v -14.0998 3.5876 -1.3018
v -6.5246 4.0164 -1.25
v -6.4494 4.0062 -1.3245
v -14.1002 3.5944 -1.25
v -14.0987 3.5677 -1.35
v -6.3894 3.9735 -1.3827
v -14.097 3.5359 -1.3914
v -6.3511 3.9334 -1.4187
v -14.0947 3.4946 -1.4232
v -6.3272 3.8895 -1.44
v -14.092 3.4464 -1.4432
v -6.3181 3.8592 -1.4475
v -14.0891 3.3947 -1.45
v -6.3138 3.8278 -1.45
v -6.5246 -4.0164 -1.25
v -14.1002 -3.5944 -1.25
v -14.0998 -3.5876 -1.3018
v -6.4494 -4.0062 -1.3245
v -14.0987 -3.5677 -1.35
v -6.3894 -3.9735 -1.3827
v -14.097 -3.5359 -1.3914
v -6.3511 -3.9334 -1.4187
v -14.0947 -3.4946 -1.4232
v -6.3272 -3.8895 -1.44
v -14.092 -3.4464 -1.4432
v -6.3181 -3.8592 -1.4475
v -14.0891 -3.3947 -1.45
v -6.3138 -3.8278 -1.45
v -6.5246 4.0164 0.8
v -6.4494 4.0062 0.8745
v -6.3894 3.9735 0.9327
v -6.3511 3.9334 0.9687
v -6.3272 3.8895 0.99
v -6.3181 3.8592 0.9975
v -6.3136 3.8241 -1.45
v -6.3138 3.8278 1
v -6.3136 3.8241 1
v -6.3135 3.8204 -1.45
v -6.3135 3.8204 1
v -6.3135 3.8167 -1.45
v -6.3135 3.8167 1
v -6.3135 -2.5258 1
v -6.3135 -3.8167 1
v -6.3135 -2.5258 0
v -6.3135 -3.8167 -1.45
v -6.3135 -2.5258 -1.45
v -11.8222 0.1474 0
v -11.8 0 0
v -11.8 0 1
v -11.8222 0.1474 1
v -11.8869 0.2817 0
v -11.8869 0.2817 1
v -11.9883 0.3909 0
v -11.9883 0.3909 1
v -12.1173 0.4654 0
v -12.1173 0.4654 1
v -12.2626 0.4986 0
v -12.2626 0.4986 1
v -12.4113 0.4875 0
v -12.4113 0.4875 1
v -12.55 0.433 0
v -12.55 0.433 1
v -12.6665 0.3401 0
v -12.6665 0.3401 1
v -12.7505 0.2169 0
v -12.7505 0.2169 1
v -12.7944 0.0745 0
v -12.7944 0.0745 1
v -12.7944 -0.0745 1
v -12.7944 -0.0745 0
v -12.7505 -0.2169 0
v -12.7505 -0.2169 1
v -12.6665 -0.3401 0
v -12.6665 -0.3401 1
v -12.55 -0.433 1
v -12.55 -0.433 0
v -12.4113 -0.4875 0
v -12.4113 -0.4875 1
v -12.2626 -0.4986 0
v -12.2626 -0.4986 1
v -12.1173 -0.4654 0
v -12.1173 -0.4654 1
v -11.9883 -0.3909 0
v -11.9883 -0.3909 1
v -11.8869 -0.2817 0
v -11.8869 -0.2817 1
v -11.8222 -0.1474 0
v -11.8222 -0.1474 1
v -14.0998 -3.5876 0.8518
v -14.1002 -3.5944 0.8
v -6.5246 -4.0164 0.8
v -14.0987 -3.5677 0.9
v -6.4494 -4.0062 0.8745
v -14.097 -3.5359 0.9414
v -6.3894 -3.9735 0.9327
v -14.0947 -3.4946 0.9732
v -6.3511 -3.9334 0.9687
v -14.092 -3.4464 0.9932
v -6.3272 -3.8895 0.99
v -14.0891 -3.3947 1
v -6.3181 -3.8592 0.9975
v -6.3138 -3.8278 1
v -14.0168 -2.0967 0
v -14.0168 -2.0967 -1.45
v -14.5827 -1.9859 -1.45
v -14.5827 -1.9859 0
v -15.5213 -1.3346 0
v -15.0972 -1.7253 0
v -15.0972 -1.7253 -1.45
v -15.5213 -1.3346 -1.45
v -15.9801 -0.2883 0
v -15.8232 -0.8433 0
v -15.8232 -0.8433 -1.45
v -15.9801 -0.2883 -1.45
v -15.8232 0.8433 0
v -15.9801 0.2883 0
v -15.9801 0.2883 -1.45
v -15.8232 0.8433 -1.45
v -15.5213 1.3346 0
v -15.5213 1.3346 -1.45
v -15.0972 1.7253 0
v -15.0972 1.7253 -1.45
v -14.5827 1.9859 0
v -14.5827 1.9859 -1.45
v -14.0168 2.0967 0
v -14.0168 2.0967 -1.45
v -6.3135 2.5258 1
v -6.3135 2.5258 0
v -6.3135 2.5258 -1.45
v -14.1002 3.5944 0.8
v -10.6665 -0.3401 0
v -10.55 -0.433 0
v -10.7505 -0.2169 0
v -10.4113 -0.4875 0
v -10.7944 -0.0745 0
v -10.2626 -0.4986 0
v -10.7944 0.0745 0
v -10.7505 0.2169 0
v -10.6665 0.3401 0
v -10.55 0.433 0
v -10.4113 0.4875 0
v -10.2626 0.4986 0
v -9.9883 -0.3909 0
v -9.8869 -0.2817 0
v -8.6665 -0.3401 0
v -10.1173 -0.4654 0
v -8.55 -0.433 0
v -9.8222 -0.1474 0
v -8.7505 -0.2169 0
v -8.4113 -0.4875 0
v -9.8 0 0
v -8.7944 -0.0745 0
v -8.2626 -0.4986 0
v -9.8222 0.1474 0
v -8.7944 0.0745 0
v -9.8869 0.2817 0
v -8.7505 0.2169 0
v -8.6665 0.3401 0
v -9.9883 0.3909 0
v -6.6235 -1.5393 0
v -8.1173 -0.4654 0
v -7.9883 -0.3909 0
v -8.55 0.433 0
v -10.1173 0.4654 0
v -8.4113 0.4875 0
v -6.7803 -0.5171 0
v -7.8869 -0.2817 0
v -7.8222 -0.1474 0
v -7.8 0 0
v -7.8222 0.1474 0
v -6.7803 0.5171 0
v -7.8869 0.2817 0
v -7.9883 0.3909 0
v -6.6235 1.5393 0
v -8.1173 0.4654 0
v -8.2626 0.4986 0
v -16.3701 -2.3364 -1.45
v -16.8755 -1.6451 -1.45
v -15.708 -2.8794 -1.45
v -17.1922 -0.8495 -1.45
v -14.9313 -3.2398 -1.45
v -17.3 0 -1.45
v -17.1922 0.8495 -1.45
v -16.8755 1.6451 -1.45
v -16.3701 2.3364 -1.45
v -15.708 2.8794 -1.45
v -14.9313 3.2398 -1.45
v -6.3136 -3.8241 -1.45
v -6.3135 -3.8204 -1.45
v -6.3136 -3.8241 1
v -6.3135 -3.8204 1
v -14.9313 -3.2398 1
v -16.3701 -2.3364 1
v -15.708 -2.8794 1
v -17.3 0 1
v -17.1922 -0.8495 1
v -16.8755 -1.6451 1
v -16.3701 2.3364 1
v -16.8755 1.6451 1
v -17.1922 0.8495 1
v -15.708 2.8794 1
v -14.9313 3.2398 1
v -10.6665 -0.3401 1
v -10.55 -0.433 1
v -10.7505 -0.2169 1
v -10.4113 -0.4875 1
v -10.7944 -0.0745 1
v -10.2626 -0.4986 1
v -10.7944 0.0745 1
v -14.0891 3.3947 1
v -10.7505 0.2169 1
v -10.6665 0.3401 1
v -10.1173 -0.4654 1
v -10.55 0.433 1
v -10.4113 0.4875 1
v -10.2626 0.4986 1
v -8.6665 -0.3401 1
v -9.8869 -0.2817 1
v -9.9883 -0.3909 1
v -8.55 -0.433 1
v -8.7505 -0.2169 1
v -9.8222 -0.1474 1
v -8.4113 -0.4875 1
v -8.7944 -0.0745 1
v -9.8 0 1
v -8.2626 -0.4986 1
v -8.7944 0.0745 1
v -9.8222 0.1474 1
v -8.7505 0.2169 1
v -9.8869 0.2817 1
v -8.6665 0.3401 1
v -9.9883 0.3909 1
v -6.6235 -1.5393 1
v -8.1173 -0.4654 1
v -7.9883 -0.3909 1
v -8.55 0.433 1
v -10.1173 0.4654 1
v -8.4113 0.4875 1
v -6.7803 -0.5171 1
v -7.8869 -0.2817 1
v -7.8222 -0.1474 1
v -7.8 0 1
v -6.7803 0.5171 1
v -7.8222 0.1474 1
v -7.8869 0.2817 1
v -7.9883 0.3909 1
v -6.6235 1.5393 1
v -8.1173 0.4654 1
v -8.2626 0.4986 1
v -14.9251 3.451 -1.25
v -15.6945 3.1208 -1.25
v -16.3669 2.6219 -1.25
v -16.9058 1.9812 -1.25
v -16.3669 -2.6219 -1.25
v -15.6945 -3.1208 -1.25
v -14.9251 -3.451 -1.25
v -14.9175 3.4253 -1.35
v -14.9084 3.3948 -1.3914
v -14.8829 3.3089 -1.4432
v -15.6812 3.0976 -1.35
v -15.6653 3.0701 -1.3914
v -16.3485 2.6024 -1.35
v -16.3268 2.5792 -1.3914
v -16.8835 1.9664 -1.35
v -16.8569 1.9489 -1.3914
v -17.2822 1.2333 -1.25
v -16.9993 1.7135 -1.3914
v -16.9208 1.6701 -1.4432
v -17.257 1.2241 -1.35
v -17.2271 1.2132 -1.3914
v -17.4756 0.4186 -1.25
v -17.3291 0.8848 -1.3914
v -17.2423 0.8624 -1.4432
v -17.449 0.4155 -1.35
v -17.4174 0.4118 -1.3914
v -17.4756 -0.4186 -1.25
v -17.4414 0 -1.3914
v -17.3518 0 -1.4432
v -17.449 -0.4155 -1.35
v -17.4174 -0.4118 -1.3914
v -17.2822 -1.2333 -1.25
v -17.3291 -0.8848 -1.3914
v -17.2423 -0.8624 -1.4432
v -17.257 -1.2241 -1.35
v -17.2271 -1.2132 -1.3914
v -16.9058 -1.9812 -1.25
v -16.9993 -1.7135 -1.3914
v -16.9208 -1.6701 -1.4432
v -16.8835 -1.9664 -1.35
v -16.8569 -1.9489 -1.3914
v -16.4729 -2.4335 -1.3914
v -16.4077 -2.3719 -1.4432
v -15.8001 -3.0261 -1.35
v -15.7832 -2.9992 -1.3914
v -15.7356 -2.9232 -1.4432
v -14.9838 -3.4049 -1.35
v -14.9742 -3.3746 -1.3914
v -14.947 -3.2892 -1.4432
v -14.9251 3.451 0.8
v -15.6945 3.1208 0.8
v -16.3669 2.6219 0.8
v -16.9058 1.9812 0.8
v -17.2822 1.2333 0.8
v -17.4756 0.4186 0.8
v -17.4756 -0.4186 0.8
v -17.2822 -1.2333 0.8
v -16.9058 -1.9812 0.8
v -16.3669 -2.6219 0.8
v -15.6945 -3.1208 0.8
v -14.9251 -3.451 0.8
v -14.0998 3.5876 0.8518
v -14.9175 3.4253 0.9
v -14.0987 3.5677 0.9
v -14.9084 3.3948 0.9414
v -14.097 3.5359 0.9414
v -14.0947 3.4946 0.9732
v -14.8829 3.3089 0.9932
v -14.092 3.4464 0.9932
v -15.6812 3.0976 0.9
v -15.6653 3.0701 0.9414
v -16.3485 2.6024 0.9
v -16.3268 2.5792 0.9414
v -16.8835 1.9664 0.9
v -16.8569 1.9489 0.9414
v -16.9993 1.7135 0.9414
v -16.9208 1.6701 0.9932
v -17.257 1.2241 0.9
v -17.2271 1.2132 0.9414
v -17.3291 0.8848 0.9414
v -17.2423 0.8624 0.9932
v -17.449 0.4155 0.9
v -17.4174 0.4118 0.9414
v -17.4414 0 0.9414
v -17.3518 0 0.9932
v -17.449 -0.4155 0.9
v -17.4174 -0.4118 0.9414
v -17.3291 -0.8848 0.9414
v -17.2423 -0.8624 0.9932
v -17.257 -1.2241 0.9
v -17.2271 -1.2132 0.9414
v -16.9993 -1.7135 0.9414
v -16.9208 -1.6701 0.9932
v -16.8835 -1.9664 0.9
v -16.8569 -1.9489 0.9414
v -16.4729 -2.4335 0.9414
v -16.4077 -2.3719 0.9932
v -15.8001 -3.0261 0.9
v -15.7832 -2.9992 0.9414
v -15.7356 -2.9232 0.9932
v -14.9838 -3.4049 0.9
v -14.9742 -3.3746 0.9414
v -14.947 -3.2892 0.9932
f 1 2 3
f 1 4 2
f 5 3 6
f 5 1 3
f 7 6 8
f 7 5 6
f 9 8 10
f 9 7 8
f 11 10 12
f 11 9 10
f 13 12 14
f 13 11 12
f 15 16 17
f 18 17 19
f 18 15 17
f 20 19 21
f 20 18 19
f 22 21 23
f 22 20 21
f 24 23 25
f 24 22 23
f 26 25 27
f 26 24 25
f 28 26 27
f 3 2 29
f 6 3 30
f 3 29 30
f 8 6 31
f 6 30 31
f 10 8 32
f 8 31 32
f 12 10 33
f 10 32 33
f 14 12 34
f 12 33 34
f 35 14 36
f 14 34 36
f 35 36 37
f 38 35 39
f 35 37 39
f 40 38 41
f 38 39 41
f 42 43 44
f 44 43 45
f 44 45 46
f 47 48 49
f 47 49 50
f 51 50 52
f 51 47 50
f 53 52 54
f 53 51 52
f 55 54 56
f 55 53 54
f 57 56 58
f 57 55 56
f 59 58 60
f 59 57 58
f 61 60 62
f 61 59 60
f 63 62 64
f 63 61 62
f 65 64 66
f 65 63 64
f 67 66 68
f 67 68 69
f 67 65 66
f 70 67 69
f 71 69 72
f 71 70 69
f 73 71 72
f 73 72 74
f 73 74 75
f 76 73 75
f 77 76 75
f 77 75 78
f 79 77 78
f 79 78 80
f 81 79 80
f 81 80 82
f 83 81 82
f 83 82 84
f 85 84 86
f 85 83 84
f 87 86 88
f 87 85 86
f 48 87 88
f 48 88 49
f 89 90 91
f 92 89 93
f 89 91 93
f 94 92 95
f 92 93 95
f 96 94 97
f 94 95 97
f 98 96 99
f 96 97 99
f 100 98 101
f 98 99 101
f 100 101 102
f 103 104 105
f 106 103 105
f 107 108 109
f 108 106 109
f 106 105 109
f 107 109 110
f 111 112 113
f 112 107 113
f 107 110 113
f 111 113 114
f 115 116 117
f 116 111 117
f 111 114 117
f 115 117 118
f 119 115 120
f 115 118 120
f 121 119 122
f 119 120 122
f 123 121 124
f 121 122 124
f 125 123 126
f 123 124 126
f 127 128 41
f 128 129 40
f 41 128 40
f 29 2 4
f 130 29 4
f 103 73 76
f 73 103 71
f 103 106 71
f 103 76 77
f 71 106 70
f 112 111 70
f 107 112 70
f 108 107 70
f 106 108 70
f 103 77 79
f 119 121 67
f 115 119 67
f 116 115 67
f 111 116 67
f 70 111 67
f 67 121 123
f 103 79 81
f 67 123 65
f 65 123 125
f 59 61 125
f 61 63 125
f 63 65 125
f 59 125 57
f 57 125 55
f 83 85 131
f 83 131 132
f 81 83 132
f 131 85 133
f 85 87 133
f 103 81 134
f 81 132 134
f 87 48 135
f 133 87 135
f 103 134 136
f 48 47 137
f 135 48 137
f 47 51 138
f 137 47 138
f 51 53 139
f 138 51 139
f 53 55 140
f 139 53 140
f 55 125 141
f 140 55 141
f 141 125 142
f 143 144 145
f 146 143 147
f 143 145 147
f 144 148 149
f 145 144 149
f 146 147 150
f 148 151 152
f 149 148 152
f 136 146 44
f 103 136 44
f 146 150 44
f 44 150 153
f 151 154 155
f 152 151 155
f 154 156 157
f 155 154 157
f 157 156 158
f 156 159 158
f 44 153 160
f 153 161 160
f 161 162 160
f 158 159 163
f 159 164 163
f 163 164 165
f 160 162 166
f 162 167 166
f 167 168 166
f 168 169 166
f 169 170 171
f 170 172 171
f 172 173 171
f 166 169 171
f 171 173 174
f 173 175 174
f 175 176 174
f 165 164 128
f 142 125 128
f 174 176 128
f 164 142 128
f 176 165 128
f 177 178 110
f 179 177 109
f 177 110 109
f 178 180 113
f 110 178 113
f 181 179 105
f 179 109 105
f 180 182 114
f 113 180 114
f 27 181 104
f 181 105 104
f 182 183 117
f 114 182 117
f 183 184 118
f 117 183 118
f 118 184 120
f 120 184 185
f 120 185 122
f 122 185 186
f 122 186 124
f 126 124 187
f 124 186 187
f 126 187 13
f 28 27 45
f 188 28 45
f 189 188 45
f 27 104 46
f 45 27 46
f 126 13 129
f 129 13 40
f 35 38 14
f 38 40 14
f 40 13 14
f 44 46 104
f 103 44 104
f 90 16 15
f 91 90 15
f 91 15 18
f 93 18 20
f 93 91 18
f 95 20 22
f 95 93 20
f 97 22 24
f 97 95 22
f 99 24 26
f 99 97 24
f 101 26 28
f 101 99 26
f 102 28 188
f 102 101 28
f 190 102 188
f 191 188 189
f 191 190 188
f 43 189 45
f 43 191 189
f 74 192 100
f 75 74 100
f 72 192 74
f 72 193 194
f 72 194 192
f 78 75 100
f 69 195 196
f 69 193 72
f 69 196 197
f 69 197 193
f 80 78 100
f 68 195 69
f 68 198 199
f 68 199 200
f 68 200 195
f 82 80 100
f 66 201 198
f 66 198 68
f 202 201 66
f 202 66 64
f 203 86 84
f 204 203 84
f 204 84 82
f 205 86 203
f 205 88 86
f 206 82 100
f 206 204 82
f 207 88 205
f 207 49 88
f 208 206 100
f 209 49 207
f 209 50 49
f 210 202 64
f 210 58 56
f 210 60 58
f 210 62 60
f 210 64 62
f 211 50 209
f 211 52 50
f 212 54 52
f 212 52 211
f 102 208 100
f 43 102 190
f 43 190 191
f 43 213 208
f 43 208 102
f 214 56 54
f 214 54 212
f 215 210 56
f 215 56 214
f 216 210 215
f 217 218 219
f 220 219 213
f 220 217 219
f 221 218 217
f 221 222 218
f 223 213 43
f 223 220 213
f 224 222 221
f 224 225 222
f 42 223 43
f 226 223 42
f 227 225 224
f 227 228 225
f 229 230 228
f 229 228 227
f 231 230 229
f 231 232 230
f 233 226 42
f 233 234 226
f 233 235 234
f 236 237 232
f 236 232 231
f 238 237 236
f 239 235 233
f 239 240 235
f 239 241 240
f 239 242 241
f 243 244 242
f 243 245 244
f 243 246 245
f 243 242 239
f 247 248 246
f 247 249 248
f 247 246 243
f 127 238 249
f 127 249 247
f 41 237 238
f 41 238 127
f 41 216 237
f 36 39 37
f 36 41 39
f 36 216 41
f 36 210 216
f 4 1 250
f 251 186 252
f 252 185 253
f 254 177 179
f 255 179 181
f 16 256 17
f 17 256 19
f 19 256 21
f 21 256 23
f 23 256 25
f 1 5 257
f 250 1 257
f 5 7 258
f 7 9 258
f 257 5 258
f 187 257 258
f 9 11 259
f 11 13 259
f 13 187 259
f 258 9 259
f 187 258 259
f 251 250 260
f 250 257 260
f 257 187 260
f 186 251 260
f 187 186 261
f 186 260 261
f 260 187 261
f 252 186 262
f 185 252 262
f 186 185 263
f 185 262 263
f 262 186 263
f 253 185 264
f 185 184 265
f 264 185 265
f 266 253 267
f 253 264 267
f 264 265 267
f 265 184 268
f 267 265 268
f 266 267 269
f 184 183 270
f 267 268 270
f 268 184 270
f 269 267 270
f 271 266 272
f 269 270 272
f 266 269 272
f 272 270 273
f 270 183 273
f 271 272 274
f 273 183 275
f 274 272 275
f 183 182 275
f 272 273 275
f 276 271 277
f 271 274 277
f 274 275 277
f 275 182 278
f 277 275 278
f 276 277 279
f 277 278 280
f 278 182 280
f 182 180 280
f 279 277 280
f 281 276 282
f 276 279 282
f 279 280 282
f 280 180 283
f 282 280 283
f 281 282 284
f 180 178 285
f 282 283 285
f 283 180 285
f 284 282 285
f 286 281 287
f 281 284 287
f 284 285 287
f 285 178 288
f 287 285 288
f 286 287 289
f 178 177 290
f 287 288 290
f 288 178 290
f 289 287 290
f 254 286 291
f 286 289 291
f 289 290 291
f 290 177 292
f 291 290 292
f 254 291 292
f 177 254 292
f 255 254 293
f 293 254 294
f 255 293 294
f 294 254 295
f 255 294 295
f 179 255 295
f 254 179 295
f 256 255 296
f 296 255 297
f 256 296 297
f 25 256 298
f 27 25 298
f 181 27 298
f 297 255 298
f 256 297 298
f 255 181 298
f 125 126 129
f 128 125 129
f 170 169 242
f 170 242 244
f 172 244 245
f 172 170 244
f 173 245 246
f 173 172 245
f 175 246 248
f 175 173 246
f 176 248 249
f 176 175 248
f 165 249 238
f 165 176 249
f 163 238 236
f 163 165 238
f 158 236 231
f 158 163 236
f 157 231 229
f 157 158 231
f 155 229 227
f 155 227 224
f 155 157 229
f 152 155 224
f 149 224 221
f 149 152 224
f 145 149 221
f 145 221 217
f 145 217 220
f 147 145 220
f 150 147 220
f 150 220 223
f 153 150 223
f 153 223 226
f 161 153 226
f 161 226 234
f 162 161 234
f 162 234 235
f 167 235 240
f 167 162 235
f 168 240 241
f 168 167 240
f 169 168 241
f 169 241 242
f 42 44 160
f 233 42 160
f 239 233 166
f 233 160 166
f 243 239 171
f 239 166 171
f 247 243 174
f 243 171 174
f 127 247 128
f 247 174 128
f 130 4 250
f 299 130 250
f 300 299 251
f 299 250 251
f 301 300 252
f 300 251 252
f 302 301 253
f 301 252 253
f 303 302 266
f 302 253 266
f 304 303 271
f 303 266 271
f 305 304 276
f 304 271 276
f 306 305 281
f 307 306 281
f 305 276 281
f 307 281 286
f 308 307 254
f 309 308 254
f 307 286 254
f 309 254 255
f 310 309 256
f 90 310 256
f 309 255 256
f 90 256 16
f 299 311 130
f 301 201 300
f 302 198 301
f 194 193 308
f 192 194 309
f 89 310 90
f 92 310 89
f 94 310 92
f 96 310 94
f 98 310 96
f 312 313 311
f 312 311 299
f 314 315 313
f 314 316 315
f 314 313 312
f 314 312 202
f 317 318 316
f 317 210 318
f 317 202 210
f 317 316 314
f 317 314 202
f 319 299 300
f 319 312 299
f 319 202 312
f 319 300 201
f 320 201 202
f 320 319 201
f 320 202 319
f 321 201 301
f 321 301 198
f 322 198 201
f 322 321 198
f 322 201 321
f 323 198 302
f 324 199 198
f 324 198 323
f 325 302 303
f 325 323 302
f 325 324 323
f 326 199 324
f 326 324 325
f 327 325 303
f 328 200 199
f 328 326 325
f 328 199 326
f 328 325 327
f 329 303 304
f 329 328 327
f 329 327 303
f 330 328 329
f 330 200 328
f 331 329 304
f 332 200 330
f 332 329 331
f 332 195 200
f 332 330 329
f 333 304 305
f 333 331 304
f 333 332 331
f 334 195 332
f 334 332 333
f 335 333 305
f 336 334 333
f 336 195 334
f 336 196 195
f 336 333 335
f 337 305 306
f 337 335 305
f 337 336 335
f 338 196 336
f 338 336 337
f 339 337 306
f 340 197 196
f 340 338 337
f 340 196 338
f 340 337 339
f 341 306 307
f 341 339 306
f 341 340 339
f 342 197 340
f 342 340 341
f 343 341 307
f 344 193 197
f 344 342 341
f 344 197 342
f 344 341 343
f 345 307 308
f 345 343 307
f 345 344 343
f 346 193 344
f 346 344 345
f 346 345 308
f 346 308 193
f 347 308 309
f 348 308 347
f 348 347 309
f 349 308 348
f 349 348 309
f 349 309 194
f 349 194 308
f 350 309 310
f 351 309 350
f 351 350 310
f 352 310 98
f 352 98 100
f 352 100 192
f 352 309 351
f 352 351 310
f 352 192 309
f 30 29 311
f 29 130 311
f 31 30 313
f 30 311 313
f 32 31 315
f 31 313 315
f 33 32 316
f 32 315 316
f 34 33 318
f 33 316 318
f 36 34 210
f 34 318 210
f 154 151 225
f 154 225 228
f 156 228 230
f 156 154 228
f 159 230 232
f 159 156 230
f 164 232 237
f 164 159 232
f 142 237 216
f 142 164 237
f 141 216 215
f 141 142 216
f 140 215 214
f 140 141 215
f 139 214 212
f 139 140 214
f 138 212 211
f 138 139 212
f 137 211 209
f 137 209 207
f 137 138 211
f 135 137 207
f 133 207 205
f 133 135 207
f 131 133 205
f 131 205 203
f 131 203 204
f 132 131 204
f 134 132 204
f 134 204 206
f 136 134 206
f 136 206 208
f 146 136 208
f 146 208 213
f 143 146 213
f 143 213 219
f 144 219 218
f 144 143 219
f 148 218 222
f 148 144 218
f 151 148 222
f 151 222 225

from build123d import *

# Parameters (mm, degrees)
SKETCH_1_R      = 0.5
EXTRUDE_1_DEPTH = 1
EXTRUDE_START   = -2.45
EXTRUDE_2_DEPTH = 2.45
FILLET_1_R      = 0.2


with BuildPart() as part:
    # 草图1 → 凸台-拉伸1 (new body)
    with BuildSketch(Plane.XY):
        with BuildLine():
            Line((-14.016792693, -2.096749739), (-6.313489141, -2.525837459))
            ThreePointArc((-6.313489141, -2.525837459), (-6.8, 0), (-6.313489141, 2.525837459))
            Line((-6.313489141, 2.525837459), (-14.016792693, 2.096749739))
            ThreePointArc((-14.016792693, 2.096749739), (-16, 0), (-14.016792693, -2.096749739))
        make_face()
        with Locations((-10.3, 0)):
            Circle(SKETCH_1_R, mode=Mode.SUBTRACT)
        with Locations((-8.3, 0)):
            Circle(SKETCH_1_R, mode=Mode.SUBTRACT)
        with Locations((-12.3, 0)):
            Circle(SKETCH_1_R, mode=Mode.SUBTRACT)
    extrude(amount=EXTRUDE_1_DEPTH)

    # 草图3 → 凸台-拉伸2 (add)
    with BuildSketch(Plane.XY.offset(1).offset(EXTRUDE_START)):
        with BuildLine():
            Line((-6.313489141, 4.028162673), (-14.100216045, 3.594428124))
            ThreePointArc((-14.100216045, 3.594428124), (-17.5, 0), (-14.100216045, -3.594428124))
            Line((-14.100216045, -3.594428124), (-6.313489141, -4.028162673))
            Line((-6.313489141, -4.028162673), (-6.313489141, -2.525837459))
            Line((-6.313489141, -2.525837459), (-14.016792693, -2.096749739))
            ThreePointArc((-14.016792693, -2.096749739), (-16, 0), (-14.016792693, 2.096749739))
            Line((-14.016792693, 2.096749739), (-6.313489141, 2.525837459))
            Line((-6.313489141, 2.525837459), (-6.313489141, 4.028162673))
        make_face()
    extrude(amount=EXTRUDE_2_DEPTH)

    # 圆角1
    fillet_1_edges = [part.edges().sort_by_distance(p)[0] for p in [
        (-10.206852593, 3.811295398, 1),
        (-17.5, 0, 1),
        (-10.206852593, -3.811295398, 1),
        (-17.5, 0, -1.45),
        (-10.206852593, -3.811295398, -1.45),
        (-6.313489141, -4.028162673, -0.225),
        (-6.313489141, 4.028162673, -0.225),
        (-10.206852593, 3.811295398, -1.45),
    ]]
    fillet(fillet_1_edges, radius=FILLET_1_R)


solid = part.part
